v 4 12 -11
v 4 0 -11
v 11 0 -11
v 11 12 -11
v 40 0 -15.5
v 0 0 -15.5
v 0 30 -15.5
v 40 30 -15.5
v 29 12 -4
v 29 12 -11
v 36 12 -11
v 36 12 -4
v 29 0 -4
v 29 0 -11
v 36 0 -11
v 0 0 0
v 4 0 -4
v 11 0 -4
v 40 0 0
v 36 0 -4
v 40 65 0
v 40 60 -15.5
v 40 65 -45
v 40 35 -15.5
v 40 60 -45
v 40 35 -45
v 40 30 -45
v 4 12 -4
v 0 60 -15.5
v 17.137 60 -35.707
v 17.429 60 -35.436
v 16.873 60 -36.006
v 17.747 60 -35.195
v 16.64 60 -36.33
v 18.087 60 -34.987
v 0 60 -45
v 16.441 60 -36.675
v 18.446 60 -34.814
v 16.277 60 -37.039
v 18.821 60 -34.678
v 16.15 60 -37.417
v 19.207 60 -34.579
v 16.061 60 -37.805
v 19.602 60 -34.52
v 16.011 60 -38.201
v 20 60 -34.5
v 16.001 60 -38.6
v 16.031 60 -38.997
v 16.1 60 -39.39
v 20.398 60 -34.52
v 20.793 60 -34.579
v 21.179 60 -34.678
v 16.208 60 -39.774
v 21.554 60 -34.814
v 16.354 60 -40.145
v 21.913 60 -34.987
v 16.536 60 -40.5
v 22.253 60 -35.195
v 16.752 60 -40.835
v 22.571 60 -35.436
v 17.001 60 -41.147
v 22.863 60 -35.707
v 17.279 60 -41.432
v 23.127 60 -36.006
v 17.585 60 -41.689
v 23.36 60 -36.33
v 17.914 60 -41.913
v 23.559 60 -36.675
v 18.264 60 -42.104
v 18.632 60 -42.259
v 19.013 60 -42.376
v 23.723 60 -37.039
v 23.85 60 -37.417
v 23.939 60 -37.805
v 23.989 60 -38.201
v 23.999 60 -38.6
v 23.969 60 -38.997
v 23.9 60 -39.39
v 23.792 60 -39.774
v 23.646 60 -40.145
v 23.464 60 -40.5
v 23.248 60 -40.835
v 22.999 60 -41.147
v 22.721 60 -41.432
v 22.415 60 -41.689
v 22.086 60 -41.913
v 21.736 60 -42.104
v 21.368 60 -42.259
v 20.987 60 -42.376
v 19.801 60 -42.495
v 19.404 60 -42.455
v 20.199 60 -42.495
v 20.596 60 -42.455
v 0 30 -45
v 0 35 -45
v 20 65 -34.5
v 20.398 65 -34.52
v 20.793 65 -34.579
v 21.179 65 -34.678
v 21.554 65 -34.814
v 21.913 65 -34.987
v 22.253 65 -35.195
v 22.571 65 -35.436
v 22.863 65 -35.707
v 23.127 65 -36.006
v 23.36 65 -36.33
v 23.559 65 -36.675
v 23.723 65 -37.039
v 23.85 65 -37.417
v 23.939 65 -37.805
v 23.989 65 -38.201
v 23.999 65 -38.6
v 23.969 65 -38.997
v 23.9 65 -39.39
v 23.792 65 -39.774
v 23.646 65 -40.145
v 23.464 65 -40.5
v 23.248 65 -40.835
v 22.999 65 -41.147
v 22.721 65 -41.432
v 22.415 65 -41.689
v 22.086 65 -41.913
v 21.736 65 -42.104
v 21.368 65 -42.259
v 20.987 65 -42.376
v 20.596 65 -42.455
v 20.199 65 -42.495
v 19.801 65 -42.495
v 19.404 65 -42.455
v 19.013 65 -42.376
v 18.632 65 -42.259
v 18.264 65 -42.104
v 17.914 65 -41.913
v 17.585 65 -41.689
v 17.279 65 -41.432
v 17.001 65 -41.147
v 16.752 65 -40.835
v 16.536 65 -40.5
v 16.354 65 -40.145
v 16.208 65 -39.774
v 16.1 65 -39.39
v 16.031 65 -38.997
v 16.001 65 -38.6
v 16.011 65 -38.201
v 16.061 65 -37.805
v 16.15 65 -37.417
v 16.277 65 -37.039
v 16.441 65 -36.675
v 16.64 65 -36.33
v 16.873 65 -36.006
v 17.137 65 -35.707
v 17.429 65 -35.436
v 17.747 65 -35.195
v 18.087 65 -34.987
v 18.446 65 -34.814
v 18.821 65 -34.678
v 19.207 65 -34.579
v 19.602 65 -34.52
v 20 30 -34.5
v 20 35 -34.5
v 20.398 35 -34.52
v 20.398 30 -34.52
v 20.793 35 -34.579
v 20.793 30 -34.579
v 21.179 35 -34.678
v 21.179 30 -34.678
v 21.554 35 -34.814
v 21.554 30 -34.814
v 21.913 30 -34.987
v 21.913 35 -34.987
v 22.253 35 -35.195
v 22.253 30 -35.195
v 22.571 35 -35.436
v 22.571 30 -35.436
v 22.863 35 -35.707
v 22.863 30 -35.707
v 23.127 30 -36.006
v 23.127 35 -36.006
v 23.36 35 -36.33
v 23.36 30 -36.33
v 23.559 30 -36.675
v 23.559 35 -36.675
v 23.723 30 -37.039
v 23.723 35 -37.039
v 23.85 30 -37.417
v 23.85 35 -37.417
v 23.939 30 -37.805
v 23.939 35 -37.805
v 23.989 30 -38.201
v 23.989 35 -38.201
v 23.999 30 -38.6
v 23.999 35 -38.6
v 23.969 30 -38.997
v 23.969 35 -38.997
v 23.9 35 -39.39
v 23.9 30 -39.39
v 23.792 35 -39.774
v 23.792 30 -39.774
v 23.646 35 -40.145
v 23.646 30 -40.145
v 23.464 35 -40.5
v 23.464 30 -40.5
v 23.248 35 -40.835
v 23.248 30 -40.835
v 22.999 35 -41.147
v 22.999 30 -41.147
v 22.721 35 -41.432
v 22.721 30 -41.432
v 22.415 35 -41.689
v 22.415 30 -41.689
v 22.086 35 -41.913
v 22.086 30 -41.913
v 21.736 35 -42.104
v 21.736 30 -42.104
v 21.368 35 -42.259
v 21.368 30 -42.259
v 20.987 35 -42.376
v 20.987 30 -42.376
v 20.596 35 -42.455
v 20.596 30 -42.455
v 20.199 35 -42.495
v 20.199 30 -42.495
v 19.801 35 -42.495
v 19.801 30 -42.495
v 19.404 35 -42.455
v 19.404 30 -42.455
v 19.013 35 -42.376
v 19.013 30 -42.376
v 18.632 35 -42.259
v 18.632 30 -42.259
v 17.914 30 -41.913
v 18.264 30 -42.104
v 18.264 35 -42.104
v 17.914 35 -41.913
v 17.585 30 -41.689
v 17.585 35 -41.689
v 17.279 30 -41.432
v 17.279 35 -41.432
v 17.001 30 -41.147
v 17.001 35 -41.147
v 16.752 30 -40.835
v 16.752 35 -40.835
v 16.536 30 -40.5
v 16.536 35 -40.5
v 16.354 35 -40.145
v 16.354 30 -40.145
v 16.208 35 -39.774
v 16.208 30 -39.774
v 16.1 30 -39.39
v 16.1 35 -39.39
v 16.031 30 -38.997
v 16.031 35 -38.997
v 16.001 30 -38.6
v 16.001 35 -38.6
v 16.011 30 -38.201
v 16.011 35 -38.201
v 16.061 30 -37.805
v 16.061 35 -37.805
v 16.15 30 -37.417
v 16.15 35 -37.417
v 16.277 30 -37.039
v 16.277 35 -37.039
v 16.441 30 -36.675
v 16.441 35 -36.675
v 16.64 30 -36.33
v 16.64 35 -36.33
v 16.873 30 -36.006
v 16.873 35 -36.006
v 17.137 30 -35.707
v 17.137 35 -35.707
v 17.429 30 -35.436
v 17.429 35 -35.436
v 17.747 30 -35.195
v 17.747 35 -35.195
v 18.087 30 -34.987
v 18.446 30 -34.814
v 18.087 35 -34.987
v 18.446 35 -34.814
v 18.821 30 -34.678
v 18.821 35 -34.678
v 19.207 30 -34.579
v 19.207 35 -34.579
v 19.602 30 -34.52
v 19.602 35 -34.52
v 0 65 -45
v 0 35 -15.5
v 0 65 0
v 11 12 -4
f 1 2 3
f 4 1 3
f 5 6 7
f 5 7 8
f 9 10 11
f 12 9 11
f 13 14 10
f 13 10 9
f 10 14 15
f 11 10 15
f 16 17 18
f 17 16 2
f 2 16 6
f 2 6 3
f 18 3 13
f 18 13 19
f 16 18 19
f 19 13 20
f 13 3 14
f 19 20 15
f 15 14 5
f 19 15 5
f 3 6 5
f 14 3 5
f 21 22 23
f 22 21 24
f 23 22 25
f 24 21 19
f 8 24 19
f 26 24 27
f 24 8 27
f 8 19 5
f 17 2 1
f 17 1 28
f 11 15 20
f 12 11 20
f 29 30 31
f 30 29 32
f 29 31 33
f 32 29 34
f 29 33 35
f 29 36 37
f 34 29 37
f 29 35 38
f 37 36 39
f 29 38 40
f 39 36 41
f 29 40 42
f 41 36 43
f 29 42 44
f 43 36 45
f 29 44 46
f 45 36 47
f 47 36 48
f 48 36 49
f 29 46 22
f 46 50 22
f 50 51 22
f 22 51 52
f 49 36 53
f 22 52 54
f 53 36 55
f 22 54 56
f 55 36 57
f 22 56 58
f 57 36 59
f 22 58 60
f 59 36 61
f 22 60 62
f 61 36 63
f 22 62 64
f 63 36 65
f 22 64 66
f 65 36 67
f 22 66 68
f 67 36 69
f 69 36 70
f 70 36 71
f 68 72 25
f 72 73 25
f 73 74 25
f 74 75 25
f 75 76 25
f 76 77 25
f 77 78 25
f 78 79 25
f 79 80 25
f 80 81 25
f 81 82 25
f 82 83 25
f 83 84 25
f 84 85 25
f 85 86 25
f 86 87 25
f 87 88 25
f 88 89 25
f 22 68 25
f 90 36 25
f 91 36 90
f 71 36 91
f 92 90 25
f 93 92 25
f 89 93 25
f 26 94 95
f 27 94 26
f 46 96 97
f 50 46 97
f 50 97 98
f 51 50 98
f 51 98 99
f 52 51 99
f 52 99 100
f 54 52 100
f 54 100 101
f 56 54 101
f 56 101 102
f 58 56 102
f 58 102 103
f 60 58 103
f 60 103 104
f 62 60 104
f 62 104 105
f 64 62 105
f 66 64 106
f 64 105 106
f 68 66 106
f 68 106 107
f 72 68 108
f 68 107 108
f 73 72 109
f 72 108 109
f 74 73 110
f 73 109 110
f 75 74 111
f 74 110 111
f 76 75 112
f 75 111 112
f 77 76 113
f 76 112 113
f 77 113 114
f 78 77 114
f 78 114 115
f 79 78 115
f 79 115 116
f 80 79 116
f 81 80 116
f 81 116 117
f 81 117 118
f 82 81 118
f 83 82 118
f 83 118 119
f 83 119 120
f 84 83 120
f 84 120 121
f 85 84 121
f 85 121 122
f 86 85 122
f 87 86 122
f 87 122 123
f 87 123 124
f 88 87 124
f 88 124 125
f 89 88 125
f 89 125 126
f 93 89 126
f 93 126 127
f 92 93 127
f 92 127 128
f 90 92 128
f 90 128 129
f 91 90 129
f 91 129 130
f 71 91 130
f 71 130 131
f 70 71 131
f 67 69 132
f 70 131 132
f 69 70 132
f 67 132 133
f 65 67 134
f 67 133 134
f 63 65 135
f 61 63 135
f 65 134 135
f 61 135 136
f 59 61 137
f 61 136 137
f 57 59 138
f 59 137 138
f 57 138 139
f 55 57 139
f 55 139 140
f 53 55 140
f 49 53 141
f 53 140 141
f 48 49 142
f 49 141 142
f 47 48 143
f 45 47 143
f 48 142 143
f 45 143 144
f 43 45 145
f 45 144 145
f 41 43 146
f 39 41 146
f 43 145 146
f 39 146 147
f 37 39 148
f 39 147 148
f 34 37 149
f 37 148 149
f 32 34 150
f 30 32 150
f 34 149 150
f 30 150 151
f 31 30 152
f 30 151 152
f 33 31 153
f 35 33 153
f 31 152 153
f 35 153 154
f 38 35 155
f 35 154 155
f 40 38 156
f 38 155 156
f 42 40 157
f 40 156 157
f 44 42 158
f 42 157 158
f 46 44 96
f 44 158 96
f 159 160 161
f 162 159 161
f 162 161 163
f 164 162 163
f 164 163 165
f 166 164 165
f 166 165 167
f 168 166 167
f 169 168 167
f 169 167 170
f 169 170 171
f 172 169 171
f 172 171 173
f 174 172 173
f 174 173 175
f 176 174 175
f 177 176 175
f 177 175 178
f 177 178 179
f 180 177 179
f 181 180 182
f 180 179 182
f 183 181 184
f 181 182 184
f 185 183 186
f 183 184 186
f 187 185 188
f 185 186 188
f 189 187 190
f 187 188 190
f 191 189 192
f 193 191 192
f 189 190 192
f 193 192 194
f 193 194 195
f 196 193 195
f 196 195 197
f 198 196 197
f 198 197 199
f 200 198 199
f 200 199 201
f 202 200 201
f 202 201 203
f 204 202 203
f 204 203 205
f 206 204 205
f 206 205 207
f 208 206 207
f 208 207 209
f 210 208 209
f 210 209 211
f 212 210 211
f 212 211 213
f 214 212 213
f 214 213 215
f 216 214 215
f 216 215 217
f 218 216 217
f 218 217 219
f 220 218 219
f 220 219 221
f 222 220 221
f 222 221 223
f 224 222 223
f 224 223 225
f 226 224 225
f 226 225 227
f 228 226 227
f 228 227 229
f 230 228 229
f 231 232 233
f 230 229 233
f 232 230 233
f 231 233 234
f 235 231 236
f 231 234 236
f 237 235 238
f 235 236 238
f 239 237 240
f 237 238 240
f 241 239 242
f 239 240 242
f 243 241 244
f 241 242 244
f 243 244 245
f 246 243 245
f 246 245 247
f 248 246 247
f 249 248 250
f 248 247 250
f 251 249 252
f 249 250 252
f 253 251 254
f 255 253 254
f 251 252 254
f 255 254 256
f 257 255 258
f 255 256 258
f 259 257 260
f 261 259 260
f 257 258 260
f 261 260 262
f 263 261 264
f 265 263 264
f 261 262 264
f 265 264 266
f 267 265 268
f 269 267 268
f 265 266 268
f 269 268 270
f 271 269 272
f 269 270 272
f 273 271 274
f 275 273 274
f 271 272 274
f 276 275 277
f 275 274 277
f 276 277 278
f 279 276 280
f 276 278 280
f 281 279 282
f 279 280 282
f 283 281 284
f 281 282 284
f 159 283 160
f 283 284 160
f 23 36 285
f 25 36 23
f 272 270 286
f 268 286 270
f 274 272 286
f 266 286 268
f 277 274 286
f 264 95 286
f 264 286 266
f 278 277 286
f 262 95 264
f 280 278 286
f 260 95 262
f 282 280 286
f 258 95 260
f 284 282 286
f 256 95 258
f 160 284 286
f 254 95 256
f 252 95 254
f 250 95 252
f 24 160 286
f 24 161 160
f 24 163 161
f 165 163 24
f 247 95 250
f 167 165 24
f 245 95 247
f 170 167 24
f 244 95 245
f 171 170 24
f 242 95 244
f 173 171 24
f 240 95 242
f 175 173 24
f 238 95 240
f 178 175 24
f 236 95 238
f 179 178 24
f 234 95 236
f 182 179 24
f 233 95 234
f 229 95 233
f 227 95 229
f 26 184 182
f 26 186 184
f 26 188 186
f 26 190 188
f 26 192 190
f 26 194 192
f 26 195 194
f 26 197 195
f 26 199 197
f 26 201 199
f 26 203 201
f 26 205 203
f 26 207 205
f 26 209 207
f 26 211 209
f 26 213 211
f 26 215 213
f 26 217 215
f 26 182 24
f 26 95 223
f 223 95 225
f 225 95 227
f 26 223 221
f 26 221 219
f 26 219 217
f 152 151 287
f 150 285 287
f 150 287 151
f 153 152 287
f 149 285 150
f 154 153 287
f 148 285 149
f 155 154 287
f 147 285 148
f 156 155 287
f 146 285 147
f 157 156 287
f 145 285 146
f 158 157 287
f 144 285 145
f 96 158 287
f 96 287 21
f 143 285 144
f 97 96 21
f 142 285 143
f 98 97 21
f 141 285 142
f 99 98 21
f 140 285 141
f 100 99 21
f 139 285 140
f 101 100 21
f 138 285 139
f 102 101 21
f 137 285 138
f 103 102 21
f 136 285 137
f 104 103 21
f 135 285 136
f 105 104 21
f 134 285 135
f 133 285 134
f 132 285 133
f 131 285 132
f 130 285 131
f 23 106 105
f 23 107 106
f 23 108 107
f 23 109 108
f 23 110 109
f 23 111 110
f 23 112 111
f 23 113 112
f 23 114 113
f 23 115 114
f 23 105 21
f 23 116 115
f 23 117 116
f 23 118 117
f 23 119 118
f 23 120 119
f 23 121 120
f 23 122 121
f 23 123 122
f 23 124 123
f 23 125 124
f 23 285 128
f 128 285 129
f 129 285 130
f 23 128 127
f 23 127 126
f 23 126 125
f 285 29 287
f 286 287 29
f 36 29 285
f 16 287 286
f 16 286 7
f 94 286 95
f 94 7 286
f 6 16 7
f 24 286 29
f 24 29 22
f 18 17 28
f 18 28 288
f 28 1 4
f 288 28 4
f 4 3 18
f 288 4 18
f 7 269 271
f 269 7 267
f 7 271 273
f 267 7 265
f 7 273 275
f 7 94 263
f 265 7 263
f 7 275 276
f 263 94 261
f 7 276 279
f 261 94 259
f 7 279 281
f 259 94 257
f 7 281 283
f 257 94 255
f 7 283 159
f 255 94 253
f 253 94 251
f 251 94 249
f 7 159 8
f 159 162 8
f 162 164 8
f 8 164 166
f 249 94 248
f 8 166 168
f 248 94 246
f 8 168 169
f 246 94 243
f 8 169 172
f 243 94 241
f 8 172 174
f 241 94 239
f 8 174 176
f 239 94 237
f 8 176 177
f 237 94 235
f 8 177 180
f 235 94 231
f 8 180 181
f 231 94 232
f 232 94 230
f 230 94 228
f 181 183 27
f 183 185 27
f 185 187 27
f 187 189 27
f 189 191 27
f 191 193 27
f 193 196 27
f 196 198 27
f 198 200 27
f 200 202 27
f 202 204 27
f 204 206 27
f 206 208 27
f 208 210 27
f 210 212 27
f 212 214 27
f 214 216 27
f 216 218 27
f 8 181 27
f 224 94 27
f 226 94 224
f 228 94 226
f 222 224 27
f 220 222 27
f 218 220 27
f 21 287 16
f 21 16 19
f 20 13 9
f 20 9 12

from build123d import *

# Parameters (mm, degrees)
ESBO_O1_W                = 40
ESBO_O1_H                = 15.5
RESSALTO_EXTRUS_O1_DEPTH = 30
ESBO_O2_W                = 7
ESBO_O2_H                = 7
CORTE_EXTRUS_O1_DEPTH    = 12
ESBO_O5_W                = 40
ESBO_O5_H                = 45
RESSALTO_EXTRUS_O2_DEPTH = 5
ESBO_O6_W                = 40
ESBO_O6_H                = 15.5
RESSALTO_EXTRUS_O3_DEPTH = 25
ESBO_O7_W                = 40
ESBO_O7_H                = 45
RESSALTO_EXTRUS_O4_DEPTH = 5
ESBO_O8_R                = 4
CORTE_EXTRUS_O2_DEPTH    = 89.600225733


with BuildPart() as part:
    # Esboço1 → Ressalto-extrusão1 (new body)
    with BuildSketch(Plane(origin=(0, 0, 0), x_dir=(1, 0, 0), z_dir=(0, 1, 0))):
        with Locations((20, 7.75)):
            Rectangle(ESBO_O1_W, ESBO_O1_H)
    extrude(amount=RESSALTO_EXTRUS_O1_DEPTH)

    # Esboço2 → Corte-extrusão1 (cut)
    with BuildSketch(Plane.XZ):
        with Locations((7.5, -7.5)):
            Rectangle(ESBO_O2_W, ESBO_O2_H)
        with Locations((32.5, -7.5)):
            Rectangle(ESBO_O2_W, ESBO_O2_H)
    extrude(amount=-CORTE_EXTRUS_O1_DEPTH, mode=Mode.SUBTRACT)

    # Esboço5 → Ressalto-extrusão2 (add)
    with BuildSketch(Plane(origin=(0, 30, 0), x_dir=(1, 0, 0), z_dir=(0, 1, 0))):
        with Locations((20, 22.5)):
            Rectangle(ESBO_O5_W, ESBO_O5_H)
    extrude(amount=RESSALTO_EXTRUS_O2_DEPTH)

    # Esboço6 → Ressalto-extrusão3 (add)
    with BuildSketch(Plane(origin=(0, 35, 0), x_dir=(1, 0, 0), z_dir=(0, 1, 0))):
        with Locations((20, 7.75)):
            Rectangle(ESBO_O6_W, ESBO_O6_H)
    extrude(amount=RESSALTO_EXTRUS_O3_DEPTH)

    # Esboço7 → Ressalto-extrusão4 (add)
    with BuildSketch(Plane(origin=(0, 60, 0), x_dir=(1, 0, 0), z_dir=(0, 1, 0))):
        with Locations((20, 22.5)):
            Rectangle(ESBO_O7_W, ESBO_O7_H)
    extrude(amount=RESSALTO_EXTRUS_O4_DEPTH)

    # Esboço8 → Corte-extrusão2 (cut, through all)
    with BuildSketch(Plane(origin=(0, 65, 0), x_dir=(1, 0, 0), z_dir=(0, 1, 0))):
        with Locations(Location((20, 38.5, 0), (0, 0, 270))):
            Circle(ESBO_O8_R)
    extrude(amount=-CORTE_EXTRUS_O2_DEPTH, mode=Mode.SUBTRACT)


solid = part.part
